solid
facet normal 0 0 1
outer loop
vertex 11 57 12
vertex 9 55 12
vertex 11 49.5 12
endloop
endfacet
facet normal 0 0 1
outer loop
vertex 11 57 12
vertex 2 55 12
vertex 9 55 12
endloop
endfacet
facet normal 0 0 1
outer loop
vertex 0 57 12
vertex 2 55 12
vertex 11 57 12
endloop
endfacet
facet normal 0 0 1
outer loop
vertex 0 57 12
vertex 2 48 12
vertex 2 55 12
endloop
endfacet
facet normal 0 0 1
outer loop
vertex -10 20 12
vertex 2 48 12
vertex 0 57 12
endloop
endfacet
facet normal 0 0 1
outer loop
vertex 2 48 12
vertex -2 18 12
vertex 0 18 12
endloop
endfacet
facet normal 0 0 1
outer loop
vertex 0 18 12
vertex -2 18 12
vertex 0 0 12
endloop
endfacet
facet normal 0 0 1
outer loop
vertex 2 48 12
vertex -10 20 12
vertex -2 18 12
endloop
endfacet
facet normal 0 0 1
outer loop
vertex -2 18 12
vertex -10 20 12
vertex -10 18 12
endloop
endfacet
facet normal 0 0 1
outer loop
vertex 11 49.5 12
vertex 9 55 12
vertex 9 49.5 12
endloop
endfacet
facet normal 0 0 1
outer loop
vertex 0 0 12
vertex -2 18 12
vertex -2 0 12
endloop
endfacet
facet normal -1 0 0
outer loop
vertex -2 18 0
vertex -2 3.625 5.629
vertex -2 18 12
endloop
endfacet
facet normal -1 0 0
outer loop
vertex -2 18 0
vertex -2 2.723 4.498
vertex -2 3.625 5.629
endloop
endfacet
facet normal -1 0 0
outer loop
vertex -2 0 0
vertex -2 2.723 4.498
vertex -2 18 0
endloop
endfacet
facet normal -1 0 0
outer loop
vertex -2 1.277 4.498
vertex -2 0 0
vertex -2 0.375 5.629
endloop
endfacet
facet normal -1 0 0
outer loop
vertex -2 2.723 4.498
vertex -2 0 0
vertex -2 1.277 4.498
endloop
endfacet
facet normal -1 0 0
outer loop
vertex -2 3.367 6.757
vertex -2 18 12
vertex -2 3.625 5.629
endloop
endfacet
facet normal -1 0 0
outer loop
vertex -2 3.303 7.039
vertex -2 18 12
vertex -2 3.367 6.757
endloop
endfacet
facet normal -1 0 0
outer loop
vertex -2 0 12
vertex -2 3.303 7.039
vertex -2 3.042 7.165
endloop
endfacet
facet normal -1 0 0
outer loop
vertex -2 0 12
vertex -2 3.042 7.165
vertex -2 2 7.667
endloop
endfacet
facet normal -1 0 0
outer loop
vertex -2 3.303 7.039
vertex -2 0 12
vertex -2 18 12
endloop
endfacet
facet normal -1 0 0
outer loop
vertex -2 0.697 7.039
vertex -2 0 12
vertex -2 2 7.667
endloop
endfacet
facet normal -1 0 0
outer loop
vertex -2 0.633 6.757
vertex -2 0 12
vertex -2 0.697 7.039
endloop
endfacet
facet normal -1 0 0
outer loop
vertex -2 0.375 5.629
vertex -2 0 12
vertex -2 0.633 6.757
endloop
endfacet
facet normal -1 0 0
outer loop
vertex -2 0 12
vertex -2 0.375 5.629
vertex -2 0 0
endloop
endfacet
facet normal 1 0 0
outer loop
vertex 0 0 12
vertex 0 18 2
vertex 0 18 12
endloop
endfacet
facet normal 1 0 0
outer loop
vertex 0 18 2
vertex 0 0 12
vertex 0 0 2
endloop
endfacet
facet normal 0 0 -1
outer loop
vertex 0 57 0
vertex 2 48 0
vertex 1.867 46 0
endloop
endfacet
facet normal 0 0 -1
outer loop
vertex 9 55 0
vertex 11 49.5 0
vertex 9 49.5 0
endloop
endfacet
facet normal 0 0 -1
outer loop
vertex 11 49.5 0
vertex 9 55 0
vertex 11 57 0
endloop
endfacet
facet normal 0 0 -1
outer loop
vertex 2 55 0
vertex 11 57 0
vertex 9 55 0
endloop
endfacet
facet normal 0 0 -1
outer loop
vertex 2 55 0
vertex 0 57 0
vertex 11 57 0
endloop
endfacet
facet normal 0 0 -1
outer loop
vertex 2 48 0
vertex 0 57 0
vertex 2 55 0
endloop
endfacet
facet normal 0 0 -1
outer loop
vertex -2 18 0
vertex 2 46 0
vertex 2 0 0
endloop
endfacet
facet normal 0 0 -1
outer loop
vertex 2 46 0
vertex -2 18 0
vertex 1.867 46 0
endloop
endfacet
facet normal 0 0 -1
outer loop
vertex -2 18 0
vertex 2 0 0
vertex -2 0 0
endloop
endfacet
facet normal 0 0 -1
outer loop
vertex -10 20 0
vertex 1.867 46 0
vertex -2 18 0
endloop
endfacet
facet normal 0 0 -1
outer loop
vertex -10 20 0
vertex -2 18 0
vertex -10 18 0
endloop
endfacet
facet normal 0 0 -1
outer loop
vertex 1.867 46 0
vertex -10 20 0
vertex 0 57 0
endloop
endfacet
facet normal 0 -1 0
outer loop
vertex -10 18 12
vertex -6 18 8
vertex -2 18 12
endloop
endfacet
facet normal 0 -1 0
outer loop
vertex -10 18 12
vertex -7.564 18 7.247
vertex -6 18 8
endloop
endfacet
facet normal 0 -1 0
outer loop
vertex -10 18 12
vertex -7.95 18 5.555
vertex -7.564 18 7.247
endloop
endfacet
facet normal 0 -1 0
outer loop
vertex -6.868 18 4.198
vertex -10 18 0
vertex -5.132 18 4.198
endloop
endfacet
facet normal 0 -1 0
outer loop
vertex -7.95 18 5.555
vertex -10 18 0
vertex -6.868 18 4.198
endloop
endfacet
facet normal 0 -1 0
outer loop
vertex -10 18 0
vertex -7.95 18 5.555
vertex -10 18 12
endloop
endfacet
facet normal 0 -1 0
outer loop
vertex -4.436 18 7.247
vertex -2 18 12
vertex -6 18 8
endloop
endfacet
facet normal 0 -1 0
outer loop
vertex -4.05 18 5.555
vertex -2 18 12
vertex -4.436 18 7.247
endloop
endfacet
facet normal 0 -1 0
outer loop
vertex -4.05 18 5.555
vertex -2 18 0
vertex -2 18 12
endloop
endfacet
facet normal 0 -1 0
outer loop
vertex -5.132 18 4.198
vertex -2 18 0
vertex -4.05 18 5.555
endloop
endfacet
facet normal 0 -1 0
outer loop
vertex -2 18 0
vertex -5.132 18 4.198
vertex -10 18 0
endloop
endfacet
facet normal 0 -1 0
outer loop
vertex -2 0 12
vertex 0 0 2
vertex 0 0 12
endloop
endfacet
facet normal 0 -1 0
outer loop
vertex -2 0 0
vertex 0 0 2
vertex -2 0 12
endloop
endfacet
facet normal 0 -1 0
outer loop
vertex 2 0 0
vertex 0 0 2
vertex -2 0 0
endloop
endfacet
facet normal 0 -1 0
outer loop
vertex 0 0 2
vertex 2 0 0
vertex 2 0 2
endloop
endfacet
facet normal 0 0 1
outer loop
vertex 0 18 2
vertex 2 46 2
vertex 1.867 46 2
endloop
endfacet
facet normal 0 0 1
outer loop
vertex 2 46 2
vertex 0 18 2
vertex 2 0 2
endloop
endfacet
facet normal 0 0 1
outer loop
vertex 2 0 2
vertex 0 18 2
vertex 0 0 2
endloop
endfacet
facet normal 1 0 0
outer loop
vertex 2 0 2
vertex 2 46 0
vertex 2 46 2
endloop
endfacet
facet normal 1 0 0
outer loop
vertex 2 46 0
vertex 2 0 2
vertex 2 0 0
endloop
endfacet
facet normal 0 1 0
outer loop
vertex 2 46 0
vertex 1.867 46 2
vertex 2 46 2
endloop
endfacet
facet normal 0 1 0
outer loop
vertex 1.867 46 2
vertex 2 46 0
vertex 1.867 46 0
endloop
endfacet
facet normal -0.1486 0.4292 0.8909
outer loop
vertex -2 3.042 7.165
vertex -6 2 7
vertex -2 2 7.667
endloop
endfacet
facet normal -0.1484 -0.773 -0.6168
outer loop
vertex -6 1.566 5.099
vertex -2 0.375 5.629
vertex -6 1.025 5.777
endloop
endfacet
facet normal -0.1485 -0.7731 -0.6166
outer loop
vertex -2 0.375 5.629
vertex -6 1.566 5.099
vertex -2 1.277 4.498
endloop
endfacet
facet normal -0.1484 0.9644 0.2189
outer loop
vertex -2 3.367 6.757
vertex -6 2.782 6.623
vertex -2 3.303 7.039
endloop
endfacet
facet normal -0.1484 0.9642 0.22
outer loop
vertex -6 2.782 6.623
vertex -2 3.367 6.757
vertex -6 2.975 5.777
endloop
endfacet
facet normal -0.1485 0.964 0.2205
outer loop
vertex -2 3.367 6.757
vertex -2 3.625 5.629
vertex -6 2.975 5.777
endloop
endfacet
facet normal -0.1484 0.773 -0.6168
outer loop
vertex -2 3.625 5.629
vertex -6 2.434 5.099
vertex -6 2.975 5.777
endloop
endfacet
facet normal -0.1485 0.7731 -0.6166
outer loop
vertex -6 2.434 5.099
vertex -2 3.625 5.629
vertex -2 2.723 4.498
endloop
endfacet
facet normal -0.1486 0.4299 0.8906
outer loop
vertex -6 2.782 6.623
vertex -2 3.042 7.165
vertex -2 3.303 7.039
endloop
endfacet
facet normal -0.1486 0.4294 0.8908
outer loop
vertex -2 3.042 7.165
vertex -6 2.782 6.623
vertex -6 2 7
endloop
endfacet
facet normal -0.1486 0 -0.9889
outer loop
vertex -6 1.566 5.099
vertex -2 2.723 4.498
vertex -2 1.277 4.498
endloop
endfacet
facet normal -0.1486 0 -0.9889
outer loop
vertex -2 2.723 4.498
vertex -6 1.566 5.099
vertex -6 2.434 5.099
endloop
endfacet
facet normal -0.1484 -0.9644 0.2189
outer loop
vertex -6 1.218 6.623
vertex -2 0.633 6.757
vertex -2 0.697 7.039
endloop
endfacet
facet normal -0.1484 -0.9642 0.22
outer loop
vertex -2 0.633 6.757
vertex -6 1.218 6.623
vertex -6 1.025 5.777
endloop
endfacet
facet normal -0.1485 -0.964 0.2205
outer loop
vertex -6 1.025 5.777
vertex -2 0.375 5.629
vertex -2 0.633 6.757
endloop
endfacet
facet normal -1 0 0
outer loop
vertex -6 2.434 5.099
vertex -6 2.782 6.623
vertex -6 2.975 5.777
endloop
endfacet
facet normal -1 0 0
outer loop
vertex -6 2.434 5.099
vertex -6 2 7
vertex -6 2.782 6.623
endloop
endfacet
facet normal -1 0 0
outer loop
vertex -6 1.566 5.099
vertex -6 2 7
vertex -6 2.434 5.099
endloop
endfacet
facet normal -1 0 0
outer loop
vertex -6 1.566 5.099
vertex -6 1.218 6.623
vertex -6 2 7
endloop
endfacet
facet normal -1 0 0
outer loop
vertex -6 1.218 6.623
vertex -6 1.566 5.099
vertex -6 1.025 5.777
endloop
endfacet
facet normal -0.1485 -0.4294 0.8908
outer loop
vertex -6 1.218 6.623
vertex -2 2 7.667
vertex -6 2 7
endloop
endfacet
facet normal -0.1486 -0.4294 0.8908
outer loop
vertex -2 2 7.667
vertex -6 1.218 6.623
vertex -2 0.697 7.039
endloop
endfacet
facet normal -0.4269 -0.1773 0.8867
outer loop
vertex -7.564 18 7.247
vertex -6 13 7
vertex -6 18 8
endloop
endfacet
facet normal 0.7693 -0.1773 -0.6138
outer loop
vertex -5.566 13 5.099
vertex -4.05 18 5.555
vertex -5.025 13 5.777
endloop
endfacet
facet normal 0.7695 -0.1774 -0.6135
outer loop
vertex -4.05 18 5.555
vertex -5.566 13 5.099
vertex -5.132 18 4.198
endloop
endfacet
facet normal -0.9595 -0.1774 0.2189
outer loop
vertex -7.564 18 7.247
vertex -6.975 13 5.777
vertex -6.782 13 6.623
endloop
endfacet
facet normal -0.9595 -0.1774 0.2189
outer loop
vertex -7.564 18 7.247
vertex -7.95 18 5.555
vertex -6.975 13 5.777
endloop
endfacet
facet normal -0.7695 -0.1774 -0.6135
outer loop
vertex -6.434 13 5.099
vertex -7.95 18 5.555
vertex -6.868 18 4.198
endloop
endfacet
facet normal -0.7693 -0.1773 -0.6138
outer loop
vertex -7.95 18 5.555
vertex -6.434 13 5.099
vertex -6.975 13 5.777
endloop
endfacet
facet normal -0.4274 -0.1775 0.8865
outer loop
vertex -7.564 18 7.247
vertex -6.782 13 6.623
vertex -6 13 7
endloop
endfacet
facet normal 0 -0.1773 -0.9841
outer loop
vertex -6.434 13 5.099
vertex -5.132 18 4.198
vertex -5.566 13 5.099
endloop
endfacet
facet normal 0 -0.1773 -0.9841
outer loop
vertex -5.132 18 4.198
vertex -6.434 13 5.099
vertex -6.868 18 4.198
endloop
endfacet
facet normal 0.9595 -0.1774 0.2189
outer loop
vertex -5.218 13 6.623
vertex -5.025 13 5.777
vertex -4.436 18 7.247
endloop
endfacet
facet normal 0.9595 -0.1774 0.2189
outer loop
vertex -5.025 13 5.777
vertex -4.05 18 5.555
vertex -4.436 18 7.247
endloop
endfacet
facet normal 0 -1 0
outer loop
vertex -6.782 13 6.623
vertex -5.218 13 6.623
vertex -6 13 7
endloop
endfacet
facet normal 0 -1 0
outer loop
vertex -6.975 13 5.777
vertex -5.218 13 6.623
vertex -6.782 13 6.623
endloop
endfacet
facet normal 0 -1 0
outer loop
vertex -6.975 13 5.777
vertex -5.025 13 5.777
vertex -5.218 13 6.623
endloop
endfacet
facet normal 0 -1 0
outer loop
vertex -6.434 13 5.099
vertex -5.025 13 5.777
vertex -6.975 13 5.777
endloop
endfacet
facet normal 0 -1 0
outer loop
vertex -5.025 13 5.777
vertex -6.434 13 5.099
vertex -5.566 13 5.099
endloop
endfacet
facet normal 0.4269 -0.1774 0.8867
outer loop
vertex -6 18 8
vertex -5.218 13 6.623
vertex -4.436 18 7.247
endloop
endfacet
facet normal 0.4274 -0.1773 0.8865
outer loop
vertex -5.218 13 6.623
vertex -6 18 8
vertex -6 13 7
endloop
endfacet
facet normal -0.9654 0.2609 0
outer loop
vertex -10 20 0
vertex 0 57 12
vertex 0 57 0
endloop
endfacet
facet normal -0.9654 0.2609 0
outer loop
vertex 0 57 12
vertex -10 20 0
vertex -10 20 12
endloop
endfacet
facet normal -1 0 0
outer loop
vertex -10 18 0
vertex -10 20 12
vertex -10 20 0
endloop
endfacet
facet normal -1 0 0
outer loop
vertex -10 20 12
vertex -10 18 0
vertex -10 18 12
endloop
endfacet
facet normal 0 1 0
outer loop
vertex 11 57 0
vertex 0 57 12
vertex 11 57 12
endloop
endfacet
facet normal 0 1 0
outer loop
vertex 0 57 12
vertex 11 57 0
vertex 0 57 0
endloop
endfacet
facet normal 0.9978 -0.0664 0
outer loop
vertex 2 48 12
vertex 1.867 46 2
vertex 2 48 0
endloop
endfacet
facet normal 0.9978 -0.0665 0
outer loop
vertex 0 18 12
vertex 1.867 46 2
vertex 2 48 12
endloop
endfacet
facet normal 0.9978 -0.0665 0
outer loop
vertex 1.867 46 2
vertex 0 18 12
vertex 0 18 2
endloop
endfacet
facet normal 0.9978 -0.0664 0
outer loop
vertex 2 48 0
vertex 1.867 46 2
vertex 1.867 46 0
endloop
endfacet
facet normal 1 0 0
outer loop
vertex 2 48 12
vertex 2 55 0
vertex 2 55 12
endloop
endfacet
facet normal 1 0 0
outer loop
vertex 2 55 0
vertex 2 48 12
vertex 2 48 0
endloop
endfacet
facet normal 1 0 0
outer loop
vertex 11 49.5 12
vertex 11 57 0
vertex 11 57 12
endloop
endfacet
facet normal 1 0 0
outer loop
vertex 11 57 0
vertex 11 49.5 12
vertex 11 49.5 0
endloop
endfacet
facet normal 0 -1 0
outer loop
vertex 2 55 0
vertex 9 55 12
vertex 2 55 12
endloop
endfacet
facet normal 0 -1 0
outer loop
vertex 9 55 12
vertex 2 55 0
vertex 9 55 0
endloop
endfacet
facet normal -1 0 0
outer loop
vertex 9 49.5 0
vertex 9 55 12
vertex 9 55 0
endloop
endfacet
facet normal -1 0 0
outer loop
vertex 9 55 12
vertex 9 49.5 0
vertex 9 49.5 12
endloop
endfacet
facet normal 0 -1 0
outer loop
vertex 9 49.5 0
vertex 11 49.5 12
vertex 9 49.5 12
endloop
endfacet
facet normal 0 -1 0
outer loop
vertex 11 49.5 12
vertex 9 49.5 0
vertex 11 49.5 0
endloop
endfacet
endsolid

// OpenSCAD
/**
 * Replacement for a clamp of an IKEA Lamp
 */
wall = 2;
width = 12;
base_length = 18;
d = 4;
glass = 7;
offset = 28;

rotate([0,-90,0]) {
    cube([width,base_length,wall]);
    translate([0,0,-wall])
    cube([wall,base_length+offset,wall]);

    translate([width/2,2,0])
        cylinder(d1=d,d2=d/2,h=6);

    translate([width/2,base_length,6])
        rotate([90,0,0])
            cylinder(d1=d,d2=d/2,h=5);

    hull(){
        translate([0,base_length,0])
            cube([width,wall,10]);
        translate([0,base_length+wall+offset,-wall])
            cube([width, glass+wall, wall]);
    }

    translate([0, base_length+wall+offset+glass,-wall-glass-wall])
        cube([width, wall, glass+wall]);

    translate([0, base_length+glass/2+offset,-wall-glass-wall])
        cube([width, glass/2+wall, wall]);
}
